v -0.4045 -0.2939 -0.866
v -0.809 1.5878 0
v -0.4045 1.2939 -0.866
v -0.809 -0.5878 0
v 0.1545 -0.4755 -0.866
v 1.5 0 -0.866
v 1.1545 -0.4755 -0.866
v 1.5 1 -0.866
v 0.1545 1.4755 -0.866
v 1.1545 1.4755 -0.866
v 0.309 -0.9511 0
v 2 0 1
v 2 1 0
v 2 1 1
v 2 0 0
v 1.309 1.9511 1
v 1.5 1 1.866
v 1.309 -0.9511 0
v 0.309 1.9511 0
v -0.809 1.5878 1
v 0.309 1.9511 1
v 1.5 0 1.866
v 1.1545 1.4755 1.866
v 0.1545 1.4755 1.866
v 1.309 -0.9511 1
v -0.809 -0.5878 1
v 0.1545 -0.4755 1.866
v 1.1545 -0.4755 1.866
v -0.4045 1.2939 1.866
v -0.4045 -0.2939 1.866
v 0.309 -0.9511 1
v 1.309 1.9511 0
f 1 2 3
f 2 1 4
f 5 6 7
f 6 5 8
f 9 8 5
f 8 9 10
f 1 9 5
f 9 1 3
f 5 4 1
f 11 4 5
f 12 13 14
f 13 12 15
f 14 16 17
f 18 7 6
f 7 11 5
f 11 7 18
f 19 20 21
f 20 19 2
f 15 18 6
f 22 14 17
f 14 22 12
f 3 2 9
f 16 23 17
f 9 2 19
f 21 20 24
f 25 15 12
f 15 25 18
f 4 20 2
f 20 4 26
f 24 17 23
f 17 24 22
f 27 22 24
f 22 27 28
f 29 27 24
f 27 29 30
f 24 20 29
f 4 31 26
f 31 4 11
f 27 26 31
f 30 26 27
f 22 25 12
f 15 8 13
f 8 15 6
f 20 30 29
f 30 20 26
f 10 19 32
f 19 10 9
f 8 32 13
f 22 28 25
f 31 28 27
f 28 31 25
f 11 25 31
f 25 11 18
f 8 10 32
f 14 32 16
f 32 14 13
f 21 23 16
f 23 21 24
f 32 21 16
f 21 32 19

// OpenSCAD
render() cube();
render(convexity = 2) cube();
render(convexity = 0) cube();
hull() { cube(); sphere(); }
hull();
minkowski() { cube(); sphere(); }
minkowski(convexity = 3) { cube(); sphere(); }
minkowski();
